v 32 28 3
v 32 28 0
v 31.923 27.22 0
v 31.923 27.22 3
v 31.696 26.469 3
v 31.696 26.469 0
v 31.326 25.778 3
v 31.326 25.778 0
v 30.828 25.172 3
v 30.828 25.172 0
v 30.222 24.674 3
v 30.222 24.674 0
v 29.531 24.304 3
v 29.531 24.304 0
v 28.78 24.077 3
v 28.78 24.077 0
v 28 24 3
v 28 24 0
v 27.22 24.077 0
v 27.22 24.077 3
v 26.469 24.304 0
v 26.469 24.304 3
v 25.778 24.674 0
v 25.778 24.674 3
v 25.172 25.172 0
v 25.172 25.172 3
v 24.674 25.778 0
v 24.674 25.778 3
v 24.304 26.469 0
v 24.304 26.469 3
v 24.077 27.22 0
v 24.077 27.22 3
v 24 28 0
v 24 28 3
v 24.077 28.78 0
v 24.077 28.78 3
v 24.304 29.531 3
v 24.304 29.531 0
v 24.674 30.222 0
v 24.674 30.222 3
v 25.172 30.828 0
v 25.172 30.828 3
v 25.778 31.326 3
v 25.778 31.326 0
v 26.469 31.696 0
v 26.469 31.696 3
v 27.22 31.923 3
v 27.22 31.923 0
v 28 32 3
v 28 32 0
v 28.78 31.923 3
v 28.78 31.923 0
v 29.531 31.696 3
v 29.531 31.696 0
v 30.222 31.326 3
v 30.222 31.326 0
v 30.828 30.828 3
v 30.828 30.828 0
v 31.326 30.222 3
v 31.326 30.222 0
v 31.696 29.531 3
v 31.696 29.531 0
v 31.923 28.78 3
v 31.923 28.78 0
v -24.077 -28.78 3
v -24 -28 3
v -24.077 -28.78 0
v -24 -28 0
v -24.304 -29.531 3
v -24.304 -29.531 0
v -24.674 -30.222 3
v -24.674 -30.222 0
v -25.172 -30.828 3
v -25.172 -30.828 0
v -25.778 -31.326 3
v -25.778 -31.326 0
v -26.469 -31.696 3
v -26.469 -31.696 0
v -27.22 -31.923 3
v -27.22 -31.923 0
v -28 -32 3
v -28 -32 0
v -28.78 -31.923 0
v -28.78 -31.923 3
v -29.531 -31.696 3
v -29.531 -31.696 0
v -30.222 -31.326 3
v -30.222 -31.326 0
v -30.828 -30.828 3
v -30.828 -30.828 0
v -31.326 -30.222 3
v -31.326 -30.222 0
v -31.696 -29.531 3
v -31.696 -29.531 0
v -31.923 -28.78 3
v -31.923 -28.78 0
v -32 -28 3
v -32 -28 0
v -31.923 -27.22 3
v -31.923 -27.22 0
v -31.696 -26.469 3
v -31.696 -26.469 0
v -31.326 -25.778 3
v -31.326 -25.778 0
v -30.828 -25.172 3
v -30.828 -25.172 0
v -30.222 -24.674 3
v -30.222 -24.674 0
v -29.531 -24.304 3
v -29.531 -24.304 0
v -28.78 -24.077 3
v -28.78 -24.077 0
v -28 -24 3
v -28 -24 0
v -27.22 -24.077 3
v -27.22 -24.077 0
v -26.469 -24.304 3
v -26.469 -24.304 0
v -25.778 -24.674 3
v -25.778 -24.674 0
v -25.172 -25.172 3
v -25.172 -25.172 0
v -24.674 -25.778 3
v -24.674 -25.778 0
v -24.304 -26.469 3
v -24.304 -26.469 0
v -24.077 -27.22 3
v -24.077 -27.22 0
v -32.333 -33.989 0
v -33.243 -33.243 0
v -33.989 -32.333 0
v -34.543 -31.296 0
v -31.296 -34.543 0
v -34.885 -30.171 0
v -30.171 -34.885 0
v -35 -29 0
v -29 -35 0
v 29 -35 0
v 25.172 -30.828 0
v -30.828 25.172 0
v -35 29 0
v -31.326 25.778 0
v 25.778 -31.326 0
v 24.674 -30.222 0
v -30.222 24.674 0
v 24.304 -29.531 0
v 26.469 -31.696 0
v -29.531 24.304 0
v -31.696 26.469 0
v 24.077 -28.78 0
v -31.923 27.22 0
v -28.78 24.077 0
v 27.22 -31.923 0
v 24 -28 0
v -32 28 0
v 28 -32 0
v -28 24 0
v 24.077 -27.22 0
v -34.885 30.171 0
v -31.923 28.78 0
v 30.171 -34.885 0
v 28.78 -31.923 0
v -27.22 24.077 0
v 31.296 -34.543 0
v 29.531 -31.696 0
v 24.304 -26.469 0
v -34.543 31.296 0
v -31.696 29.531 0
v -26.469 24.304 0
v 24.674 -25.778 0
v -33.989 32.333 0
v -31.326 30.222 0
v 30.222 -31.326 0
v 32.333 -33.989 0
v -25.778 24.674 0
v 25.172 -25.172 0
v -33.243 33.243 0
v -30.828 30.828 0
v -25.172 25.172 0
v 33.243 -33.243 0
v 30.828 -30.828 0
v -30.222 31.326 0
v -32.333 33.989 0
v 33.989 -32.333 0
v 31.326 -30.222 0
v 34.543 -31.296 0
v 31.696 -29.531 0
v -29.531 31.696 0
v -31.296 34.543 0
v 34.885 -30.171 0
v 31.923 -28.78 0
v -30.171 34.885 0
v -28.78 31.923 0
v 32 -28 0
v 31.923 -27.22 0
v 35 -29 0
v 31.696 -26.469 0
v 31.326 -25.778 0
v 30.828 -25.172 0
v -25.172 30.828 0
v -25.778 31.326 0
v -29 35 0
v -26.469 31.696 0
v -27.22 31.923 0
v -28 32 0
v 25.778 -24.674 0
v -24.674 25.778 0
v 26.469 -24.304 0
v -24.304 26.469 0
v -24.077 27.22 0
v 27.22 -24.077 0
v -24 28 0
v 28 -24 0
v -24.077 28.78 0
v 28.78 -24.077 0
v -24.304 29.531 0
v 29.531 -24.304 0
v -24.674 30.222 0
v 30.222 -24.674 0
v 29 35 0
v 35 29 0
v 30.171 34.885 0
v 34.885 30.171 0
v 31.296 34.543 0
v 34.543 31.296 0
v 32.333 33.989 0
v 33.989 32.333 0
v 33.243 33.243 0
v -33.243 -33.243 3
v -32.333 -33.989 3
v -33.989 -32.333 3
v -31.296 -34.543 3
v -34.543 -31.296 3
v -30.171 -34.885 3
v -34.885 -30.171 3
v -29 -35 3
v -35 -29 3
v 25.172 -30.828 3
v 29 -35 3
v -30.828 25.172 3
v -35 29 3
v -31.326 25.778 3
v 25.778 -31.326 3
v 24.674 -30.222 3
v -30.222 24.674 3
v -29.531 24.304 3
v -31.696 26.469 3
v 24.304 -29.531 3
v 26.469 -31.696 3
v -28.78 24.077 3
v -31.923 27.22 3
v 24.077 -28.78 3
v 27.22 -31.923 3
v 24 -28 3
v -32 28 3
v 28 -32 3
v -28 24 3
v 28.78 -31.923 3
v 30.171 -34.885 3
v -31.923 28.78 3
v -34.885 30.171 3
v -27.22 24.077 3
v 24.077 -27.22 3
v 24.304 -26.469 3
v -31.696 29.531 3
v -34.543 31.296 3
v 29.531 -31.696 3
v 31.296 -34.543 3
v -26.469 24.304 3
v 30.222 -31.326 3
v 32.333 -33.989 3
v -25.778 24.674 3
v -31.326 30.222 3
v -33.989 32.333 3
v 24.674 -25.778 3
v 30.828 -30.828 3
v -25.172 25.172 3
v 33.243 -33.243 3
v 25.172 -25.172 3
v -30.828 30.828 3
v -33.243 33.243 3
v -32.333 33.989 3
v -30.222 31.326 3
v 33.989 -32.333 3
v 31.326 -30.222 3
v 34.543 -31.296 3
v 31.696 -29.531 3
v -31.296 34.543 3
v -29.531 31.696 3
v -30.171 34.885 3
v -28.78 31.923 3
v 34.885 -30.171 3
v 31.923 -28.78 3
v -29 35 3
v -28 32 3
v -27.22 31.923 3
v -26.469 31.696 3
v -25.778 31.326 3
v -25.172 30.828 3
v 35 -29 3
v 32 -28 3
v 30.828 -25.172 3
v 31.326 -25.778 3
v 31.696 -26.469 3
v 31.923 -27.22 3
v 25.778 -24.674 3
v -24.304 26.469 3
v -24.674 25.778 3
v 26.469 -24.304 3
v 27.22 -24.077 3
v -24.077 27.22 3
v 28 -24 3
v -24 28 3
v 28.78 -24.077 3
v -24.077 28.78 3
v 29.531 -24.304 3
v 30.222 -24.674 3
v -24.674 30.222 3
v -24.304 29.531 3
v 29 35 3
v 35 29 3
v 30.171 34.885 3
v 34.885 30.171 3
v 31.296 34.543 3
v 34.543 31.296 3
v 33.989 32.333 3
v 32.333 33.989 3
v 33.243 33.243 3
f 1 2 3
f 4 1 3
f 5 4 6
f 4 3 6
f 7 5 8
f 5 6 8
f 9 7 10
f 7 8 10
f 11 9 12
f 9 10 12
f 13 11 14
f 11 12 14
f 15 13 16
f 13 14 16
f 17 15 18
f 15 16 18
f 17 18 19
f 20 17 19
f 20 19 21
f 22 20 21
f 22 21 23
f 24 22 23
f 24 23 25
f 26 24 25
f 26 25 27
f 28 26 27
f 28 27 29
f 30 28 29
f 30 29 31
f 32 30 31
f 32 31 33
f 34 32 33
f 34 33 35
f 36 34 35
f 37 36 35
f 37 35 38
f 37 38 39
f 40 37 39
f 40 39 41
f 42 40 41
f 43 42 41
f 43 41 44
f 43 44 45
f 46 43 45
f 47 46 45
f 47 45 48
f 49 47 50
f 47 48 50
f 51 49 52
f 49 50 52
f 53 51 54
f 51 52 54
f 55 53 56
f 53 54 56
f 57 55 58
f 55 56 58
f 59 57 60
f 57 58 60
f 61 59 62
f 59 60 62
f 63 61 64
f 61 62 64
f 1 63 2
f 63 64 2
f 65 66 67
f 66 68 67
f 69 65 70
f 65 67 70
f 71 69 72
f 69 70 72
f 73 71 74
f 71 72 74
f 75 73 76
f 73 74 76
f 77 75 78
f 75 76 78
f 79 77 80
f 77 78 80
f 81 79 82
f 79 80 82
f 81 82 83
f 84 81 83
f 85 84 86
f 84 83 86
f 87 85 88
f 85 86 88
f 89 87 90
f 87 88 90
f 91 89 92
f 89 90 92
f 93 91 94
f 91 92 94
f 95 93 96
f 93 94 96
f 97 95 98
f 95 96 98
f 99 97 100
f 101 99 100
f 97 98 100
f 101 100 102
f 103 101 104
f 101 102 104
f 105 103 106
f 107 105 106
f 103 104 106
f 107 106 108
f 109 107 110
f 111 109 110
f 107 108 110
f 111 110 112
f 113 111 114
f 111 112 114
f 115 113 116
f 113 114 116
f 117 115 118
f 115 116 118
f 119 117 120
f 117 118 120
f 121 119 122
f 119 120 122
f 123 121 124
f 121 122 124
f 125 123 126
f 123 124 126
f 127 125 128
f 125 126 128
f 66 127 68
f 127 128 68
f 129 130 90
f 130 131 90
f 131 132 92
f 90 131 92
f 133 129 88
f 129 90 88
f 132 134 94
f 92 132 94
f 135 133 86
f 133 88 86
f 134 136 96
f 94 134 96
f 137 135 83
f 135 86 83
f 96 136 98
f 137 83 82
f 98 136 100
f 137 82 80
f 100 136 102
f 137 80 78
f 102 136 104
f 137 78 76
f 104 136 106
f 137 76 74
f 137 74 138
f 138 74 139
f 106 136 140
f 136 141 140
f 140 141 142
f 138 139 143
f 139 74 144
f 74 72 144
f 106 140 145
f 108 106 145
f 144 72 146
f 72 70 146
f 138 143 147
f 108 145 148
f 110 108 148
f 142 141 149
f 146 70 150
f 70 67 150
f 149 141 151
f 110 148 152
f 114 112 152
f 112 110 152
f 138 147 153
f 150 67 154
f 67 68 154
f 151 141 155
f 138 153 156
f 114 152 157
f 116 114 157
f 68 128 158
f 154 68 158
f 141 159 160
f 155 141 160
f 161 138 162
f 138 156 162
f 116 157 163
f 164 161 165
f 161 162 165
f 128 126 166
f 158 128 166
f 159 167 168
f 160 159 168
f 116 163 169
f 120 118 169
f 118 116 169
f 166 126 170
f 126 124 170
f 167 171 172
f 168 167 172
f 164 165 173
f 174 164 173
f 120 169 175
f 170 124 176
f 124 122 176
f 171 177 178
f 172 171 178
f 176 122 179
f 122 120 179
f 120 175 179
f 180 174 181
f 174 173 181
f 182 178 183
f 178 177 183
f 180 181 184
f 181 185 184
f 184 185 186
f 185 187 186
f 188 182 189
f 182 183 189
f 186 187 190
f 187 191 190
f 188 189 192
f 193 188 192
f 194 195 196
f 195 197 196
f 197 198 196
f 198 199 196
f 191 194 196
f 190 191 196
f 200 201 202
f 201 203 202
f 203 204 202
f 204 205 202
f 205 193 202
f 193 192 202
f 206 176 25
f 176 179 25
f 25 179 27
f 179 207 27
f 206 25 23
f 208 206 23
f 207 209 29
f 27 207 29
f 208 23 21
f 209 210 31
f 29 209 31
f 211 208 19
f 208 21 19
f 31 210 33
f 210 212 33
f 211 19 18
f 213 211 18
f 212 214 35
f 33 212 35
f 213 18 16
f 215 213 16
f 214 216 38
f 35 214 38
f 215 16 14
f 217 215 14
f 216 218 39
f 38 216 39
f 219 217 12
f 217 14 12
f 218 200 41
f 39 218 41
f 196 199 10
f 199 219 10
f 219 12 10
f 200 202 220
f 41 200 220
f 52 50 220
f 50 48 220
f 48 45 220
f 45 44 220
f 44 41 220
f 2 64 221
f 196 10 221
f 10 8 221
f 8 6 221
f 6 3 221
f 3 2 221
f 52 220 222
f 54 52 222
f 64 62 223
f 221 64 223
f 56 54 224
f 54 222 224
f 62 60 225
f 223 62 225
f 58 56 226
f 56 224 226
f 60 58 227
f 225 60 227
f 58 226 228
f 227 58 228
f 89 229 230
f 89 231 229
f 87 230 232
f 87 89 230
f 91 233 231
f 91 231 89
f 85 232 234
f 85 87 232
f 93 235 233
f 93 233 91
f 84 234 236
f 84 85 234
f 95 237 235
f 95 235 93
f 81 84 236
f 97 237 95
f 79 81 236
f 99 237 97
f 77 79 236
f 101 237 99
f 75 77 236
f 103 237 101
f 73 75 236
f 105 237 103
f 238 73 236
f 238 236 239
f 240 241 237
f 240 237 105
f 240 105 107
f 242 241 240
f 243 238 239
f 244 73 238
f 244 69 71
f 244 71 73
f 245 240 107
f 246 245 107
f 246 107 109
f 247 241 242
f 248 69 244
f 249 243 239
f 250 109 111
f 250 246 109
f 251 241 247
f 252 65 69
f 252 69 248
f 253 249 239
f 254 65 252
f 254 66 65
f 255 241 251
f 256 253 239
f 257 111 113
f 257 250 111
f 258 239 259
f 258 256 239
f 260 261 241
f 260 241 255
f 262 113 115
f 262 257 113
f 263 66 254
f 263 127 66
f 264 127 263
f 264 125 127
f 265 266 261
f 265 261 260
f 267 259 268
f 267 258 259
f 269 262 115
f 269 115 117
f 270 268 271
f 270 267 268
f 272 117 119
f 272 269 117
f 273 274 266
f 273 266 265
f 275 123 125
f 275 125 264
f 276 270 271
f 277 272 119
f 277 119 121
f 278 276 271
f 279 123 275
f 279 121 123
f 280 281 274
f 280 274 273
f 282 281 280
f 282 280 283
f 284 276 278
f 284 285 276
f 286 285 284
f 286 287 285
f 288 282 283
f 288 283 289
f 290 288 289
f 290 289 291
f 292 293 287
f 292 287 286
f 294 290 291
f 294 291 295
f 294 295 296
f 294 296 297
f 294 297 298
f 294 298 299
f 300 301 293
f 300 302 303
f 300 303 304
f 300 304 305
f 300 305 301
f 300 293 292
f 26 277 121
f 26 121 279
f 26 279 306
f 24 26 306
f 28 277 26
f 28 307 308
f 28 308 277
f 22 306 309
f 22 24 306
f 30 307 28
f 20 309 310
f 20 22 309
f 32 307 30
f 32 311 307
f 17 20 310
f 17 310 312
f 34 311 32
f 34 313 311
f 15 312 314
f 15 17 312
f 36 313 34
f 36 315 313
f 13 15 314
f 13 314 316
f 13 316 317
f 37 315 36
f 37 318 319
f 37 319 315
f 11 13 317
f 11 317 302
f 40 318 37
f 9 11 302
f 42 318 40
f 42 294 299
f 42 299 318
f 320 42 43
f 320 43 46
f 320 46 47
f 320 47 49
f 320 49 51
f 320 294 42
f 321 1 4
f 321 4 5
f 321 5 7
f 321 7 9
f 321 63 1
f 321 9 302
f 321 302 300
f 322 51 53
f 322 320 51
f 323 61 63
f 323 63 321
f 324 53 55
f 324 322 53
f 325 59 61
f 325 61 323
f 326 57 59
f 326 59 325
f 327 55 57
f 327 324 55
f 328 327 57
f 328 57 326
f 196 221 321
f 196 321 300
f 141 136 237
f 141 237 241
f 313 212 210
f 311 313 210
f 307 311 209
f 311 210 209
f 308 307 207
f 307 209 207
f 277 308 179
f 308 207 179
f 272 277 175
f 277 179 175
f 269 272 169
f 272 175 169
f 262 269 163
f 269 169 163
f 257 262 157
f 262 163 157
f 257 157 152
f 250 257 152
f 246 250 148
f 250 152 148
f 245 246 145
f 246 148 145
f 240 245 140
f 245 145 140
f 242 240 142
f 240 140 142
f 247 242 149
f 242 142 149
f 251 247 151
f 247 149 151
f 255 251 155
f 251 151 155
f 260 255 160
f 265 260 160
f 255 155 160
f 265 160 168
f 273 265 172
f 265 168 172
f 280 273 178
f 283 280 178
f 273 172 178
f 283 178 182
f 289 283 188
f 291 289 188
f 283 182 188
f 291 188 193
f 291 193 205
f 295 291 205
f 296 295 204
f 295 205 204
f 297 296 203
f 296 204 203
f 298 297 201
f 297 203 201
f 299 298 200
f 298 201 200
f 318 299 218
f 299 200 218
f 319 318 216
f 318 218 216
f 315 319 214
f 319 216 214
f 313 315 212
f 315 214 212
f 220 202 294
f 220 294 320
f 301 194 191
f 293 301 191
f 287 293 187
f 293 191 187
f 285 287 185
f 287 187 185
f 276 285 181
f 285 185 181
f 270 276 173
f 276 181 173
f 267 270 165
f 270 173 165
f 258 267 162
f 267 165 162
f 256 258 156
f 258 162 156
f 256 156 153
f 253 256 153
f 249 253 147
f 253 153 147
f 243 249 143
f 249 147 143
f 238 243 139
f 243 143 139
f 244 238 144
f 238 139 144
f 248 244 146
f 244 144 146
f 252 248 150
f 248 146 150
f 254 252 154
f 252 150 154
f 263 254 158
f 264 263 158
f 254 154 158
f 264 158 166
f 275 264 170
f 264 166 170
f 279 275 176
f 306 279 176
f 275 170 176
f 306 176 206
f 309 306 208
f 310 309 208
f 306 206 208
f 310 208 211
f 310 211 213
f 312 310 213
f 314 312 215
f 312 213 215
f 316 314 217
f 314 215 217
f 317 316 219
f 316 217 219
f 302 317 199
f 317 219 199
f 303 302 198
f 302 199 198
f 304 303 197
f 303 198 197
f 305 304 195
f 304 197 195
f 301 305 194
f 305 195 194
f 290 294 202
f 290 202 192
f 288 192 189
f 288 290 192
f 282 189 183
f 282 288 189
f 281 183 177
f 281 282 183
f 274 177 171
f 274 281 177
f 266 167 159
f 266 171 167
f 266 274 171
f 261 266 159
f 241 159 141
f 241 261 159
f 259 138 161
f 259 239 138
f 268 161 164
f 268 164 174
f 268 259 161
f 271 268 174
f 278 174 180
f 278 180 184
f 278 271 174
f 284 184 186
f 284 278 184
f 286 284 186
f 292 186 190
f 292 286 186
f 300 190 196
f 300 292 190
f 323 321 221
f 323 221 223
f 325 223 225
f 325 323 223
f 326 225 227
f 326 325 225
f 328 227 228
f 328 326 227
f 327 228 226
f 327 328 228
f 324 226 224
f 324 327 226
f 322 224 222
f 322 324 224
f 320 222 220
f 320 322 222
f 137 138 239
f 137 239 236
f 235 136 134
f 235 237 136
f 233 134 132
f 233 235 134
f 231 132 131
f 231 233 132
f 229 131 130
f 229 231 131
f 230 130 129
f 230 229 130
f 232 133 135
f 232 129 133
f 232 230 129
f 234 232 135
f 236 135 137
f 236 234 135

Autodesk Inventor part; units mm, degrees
ref_plane "YZ Plane" through (0, 0, 0) normal (1, 0, 0) x (0, 1, 0)
ref_plane "XZ Plane" through (0, 0, 0) normal (0, 1, 0) x (-1, 0, 0)
ref_plane "XY Plane" through (0, 0, 0) normal (0, 0, 1) x (1, 0, 0)
sketch "Sketch1" plane through (0, 0, 0) normal (0, 0, 1) x (1, 0, 0)
  line L0 (35, -35) -> (-35, -35)
  line L1 (-35, -35) -> (-35, 35)
  line L2 (-35, 35) -> (35, 35)
  line L3 (35, 35) -> (35, -35)
  line L4 (35, 35) -> (-35, -35) construction
  point P0 (0, 0)
  point P1 (0, 0)
  dimension "d1" = 70
  dimension "d2" = 70
extrude "Plate1" add sketch "Sketch1" along normal blind 3
sketch "Sketch2" plane through (0, 0, 0) normal (0, 0, 1) x (1, 0, 0)
  line L0 (28, -28) -> (-28, -28) construction
  line L1 (-28, -28) -> (-28, 28) construction
  line L2 (-28, 28) -> (28, 28) construction
  line L3 (28, 28) -> (28, -28) construction
  line L4 (28, -28) -> (-28, 28) construction
  line L5 (-28, -28) -> (28, 28) construction
  circle A0 centre (-28, -28) radius 4
  circle A1 centre (28, -28) radius 4
  circle A2 centre (28, 28) radius 4
  circle A3 centre (-28, 28) radius 4
  line L6 (28, 0) -> (-28, 0) construction
  line L7 (-20, 20) -> (20, 20) construction
  line L8 (20, 20) -> (20, -20) construction
  line L9 (20, -20) -> (-20, -20) construction
  line L10 (-20, -20) -> (-20, 20) construction
  line L11 (-20, 20) -> (20, -20) construction
  line L12 (20, 20) -> (-20, -20) construction
  line L13 (-35, -35) -> (-35, 35) projected
  line L14 (35, -35) -> (-35, -35) projected
  line L15 (35, 35) -> (35, -35) projected
  line L16 (-35, 35) -> (35, 35) projected
  point P0 (0, 0)
  point P1 (75, 0)
  point P2 (0, 0)
  dimension "d7" = 8
  dimension "d33" = 40
  dimension "d35" = 7
extrude "Extrusion1" cut sketch "Sketch2" along normal through all contours A0 | A1 | A2 | A3
fillet "Corner Round1" radius 6 4 edges at (-35, 35, 1.5) (35, 35, 1.5) (35, -35, 1.5) (-35, -35, 1.5)
equation "\"d1\" = d2"
equation "\"d0\" = Thickness"
equation "\"BendRadius\" = Thickness"
equation "\"BendReliefWidth\" = Thickness"
equation "\"BendReliefDepth\" = 0.5 * Thickness"
equation "\"CornerReliefSize\" = 4 * Thickness"
equation "\"MinimumRemnant\" = 2 * Thickness"
equation "\"TransitionRadius\" = BendRadius"
equation "\"JacobiRadiusSize\" = BendRadius"
equation "\"GapSize\" = Thickness"
equation "\"Thickness\" = 3"
properties part number "GNH 018  Plate pulse pillar" material "Stainless Steel"
